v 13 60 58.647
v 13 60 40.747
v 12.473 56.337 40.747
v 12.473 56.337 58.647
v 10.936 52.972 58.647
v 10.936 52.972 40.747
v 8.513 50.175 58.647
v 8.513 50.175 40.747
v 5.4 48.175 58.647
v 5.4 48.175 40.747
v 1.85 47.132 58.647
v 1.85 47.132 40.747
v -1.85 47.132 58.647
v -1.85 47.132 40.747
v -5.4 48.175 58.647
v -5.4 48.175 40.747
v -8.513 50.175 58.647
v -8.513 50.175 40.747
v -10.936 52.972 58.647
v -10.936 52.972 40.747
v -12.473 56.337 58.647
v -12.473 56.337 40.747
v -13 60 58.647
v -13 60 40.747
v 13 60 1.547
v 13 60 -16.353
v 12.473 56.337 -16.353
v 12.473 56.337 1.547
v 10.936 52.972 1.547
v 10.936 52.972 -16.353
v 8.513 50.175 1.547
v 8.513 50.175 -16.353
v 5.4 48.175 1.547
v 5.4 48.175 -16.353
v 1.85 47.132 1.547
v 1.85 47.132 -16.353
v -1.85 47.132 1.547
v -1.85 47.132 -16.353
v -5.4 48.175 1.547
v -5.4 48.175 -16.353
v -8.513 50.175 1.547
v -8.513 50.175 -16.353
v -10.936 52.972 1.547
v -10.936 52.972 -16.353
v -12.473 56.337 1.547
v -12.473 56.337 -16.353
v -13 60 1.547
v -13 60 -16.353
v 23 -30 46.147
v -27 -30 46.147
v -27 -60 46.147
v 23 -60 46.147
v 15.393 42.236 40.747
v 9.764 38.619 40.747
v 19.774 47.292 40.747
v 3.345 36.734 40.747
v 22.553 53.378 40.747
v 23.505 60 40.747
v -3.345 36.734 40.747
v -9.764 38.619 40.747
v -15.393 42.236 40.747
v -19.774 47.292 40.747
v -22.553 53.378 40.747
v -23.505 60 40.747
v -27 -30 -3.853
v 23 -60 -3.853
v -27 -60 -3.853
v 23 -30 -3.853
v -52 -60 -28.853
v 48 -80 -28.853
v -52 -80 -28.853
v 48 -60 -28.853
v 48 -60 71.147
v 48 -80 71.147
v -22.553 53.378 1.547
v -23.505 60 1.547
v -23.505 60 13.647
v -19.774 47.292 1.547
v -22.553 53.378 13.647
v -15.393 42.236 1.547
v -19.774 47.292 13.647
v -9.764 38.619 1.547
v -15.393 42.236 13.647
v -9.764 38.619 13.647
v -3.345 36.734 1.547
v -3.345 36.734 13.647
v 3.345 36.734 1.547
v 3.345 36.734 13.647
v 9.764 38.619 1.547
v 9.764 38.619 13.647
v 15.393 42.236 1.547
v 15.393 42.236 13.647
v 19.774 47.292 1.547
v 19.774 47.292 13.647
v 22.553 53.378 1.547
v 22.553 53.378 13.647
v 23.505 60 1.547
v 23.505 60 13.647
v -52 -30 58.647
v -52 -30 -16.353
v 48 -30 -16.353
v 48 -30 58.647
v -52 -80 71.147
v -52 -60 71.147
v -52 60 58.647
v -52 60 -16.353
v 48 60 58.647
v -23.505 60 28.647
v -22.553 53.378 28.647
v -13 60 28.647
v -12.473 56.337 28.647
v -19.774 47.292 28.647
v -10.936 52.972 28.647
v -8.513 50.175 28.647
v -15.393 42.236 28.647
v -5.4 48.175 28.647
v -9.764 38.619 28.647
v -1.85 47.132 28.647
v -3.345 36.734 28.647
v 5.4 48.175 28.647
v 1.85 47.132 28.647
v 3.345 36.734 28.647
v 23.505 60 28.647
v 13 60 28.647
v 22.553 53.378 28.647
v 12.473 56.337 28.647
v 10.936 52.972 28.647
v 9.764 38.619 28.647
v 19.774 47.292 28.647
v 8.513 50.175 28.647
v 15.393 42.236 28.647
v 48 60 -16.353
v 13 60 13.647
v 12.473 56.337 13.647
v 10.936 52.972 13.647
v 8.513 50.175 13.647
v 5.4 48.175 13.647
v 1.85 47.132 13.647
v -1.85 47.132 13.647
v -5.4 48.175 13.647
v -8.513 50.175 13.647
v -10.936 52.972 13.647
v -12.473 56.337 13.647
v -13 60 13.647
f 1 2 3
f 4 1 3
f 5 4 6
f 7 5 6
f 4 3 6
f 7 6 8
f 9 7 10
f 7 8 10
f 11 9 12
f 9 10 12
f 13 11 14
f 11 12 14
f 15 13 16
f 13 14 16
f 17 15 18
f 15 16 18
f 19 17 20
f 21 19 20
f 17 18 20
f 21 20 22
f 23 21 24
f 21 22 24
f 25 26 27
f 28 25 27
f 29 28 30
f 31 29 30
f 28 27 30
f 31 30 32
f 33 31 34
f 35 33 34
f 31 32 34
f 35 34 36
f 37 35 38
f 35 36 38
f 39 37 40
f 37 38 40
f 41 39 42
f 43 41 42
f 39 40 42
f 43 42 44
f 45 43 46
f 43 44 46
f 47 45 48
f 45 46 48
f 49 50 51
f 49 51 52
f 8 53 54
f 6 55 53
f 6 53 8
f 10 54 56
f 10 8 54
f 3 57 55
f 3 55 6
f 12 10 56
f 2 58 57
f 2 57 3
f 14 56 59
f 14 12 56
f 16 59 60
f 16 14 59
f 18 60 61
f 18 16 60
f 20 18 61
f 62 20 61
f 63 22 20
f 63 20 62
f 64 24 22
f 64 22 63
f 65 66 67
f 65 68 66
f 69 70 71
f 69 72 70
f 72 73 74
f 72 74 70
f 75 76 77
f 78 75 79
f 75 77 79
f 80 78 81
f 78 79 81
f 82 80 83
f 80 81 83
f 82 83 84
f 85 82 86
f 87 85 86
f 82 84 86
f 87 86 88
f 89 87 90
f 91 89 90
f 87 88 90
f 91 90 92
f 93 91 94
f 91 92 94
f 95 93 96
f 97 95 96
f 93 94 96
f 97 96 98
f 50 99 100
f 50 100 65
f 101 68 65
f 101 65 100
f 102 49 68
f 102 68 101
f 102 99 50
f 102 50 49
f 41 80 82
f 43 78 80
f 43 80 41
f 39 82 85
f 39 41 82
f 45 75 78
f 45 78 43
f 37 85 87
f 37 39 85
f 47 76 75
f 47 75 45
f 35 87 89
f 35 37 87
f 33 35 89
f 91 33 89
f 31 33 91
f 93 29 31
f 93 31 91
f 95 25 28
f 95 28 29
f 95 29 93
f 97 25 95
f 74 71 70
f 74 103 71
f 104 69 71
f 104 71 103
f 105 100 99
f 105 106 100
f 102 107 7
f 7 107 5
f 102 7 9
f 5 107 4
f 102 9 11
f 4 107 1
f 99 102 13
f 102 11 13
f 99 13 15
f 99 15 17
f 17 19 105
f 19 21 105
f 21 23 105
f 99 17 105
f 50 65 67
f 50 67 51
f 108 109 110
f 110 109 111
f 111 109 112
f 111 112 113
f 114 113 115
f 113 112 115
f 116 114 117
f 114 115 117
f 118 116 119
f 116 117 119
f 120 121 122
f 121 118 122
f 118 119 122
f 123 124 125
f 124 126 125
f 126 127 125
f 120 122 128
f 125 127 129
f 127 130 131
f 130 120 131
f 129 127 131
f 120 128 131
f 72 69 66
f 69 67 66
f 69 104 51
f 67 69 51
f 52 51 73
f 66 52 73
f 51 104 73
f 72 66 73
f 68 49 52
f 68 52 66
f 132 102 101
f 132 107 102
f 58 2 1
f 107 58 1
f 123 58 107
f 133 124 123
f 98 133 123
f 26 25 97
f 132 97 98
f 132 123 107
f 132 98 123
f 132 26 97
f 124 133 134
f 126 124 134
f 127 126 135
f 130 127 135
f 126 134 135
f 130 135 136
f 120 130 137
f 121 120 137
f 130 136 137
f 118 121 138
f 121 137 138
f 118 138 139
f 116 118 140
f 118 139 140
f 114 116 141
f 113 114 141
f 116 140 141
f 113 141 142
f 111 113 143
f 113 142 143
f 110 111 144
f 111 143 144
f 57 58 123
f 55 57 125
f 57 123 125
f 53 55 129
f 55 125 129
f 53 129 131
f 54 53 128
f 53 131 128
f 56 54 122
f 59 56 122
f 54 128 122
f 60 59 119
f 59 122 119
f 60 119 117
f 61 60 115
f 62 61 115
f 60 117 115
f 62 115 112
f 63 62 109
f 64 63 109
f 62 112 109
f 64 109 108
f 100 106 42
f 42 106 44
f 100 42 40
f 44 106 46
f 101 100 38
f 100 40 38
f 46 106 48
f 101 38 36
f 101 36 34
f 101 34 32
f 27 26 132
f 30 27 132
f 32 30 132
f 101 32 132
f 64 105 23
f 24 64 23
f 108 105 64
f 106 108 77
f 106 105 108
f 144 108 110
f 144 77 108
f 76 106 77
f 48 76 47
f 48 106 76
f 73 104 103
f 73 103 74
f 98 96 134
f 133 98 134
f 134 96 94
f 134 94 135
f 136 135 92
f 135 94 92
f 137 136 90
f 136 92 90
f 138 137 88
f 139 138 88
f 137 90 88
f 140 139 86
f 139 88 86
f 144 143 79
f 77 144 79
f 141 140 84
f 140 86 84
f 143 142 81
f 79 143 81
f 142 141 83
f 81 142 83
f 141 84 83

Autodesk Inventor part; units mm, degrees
ref_plane "YZ Plane" through (0, 0, 0) normal (1, 0, 0) x (0, 1, 0)
ref_plane "XZ Plane" through (0, 0, 0) normal (0, 1, 0) x (-1, 0, 0)
ref_plane "XY Plane" through (0, 0, 0) normal (0, 0, 1) x (1, 0, 0)
sketch "Sketch1" plane through (0, 0, 0) normal (0, 1, 0) x (-1, 0, 0)
  line L0 (52, 58.6471) -> (-48, 58.6471)
  line L1 (-48, 58.6471) -> (-48, -16.3529)
  line L2 (-48, -16.3529) -> (52, -16.3529)
  line L3 (52, -16.3529) -> (52, 58.6471)
  point P0 (0, 0)
  dimension "d0" = 100
  dimension "d1" = 75
extrude "Extrusion1" add sketch "Sketch1" along normal blind 60
sketch "Sketch2" plane through (0, 60, 0) normal (0, 1, 0) x (1, 0, 0)
  line L0 (-47, -53.6471) -> (43, -53.6471)
  line L1 (43, -53.6471) -> (43, 11.3529)
  line L2 (43, 11.3529) -> (-47, 11.3529)
  line L3 (-47, 11.3529) -> (-47, -53.6471)
  line L4 (-52, 16.3529) -> (-52, -58.6471) projected
  line L5 (-52, -58.6471) -> (48, -58.6471) projected
  line L6 (48, 16.3529) -> (-52, 16.3529) projected
  line L7 (48, -58.6471) -> (48, 16.3529) projected
  point P0 (0, 0)
  dimension "d4" = 5
  dimension "d5" = 5
  dimension "d6" = 5
  dimension "d7" = 5
extrude "Extrusion2" cut sketch "Sketch2" against normal blind 59 contours L3 L2 L1 L0
sketch "Sketch3" plane through (48, 0, -16.3529) normal (0, 0, -1) x (-1, 0, 0)
  circle A0 centre (48, 60) radius 13
  point P0 (48, 0)
  dimension "d10" = 26
  dimension "d11" = 60
sketch "Sketch13" plane through (0, 1, 0) normal (0, 1, 0) x (1, 0, 0)
  line L0 (-47, -53.6471) -> (-47, 11.3529) projected
  line L1 (43, 11.3529) -> (43, -53.6471) projected
  line L2 (-47, 11.3529) -> (43, 11.3529)
  line L3 (43, 11.3529) -> (43, -13.6471)
  line L4 (43, -13.6471) -> (-47, -13.6471)
  line L5 (-47, -13.6471) -> (-47, 11.3529)
  point P0 (0, 0)
  dimension "d44" = 25
extrude "Extrusion14" add sketch "Sketch13" along normal blind 59
sketch "Sketch14" plane through (-47, 1, 13.6471) normal (0, 0, 1) x (1, 0, 0)
  line L0 (0, 59) -> (90, 59) projected
  circle A0 centre (47, 59) radius 23.505
  point P0 (47, -1)
  dimension "d47" = 47.01
extrude "Extrusion15" cut sketch "Sketch14" against normal blind 12.1
sketch "Sketch15" plane through (0, 1, 0) normal (0, 1, 0) x (1, 0, 0)
  line L0 (-47, -53.6471) -> (-47, -13.6471) projected
  line L1 (43, -13.6471) -> (43, -53.6471) projected
  line L2 (-47, -53.6471) -> (43, -53.6471)
  line L3 (43, -53.6471) -> (43, -28.6471)
  line L4 (43, -28.6471) -> (-47, -28.6471)
  line L5 (-47, -28.6471) -> (-47, -53.6471)
  point P0 (0, 0)
  point P1 (-47, -28.6471)
  dimension "d50" = 25
extrude "Extrusion16" add sketch "Sketch15" along normal blind 59
sketch "Sketch16" plane through (43, 1, 28.6471) normal (0, 0, -1) x (-1, 0, 0)
  line L0 (0, 59) -> (90, 59) projected
  circle A0 centre (43, 59) radius 23.505
  point P0 (43, -1)
  dimension "d53" = 47.01
extrude "Extrusion17" cut sketch "Sketch16" against normal blind 12.1
sketch "Sketch17" plane through (0, 1, 0) normal (0, 1, 0) x (1, 0, 0)
  line L0 (23.505, -13.6471) -> (43, -13.6471) projected
  line L1 (-47, -28.6471) -> (43, -28.6471)
  line L2 (43, -28.6471) -> (43, -13.6471)
  line L3 (43, -13.6471) -> (-47, -13.6471)
  line L4 (-47, -13.6471) -> (-47, -28.6471)
  point P0 (0, 0)
extrude "Extrusion18" add sketch "Sketch17" along normal blind 59
extrude "Extrusion19" cut sketch "Sketch3" against normal blind 75
sketch "Sketch19" plane through (0, 0, 0) normal (0, -1, 0) x (1, 0, 0)
  line L0 (48, 58.6471) -> (48, -16.3529) projected
  line L1 (-52, -16.3529) -> (-52, 58.6471) projected
  line L2 (48, 58.6471) -> (-52, 58.6471)
  line L3 (-52, 58.6471) -> (-52, -16.3529)
  line L4 (-52, -16.3529) -> (48, -16.3529)
  line L5 (48, -16.3529) -> (48, 58.6471)
  point P0 (0, 0)
extrude "Extrusion21" add sketch "Sketch19" along normal blind 30
sketch "Sketch20" plane through (0, -30, 0) normal (0, -1, 0) x (1, 0, 0)
  point P0 (0, 0)
sketch "Sketch21" plane through (0, -30, 0) normal (0, -1, 0) x (1, 0, 0)
  line L0 (23, -3.8529) -> (-27, -3.8529)
  line L1 (-27, -3.8529) -> (-27, 46.1471)
  line L2 (-27, 46.1471) -> (23, 46.1471)
  line L3 (23, 46.1471) -> (23, -3.8529)
  line L4 (-52, -16.3529) -> (48, -16.3529) projected
  line L5 (48, 58.6471) -> (-52, 58.6471) projected
  line L6 (-52, 58.6471) -> (-52, -16.3529) projected
  line L7 (48, -16.3529) -> (48, 58.6471) projected
  point P0 (0, 0)
  dimension "d66" = 12.5
  dimension "d67" = 12.5
  dimension "d68" = 25
  dimension "d69" = 25
extrude "Extrusion22" add sketch "Sketch21" along normal blind 30 contours L0 L1 L2 L3
sketch "Sketch22" plane through (0, -60, 0) normal (0, -1, 0) x (1, 0, 0)
  line L0 (48, -28.8529) -> (-52, -28.8529)
  line L1 (-52, -28.8529) -> (-52, 71.1471)
  line L2 (-52, 71.1471) -> (48, 71.1471)
  line L3 (48, 71.1471) -> (48, -28.8529)
  line L4 (-27, -3.8529) -> (23, -3.8529) projected
  line L5 (23, -3.8529) -> (23, 46.1471) projected
  line L6 (23, 46.1471) -> (-27, 46.1471) projected
  line L7 (-27, 46.1471) -> (-27, -3.8529) projected
  point P0 (0, 0)
  dimension "d72" = 25
  dimension "d73" = 25
  dimension "d74" = 25
  dimension "d75" = 25
extrude "Extrusion23" add sketch "Sketch22" along normal blind 20 contours L0 L1 L2 L3 | L7 L6 L5 L4
equation "\"d6\" = d5"
equation "\"d7\" = d4"
equation "\"d67\" = d66"
equation "\"d68\" = d69"
equation "\"d72\" = d73"
equation "\"d74\" = d73"
equation "\"d75\" = d73"
properties part number "casing bottom"
